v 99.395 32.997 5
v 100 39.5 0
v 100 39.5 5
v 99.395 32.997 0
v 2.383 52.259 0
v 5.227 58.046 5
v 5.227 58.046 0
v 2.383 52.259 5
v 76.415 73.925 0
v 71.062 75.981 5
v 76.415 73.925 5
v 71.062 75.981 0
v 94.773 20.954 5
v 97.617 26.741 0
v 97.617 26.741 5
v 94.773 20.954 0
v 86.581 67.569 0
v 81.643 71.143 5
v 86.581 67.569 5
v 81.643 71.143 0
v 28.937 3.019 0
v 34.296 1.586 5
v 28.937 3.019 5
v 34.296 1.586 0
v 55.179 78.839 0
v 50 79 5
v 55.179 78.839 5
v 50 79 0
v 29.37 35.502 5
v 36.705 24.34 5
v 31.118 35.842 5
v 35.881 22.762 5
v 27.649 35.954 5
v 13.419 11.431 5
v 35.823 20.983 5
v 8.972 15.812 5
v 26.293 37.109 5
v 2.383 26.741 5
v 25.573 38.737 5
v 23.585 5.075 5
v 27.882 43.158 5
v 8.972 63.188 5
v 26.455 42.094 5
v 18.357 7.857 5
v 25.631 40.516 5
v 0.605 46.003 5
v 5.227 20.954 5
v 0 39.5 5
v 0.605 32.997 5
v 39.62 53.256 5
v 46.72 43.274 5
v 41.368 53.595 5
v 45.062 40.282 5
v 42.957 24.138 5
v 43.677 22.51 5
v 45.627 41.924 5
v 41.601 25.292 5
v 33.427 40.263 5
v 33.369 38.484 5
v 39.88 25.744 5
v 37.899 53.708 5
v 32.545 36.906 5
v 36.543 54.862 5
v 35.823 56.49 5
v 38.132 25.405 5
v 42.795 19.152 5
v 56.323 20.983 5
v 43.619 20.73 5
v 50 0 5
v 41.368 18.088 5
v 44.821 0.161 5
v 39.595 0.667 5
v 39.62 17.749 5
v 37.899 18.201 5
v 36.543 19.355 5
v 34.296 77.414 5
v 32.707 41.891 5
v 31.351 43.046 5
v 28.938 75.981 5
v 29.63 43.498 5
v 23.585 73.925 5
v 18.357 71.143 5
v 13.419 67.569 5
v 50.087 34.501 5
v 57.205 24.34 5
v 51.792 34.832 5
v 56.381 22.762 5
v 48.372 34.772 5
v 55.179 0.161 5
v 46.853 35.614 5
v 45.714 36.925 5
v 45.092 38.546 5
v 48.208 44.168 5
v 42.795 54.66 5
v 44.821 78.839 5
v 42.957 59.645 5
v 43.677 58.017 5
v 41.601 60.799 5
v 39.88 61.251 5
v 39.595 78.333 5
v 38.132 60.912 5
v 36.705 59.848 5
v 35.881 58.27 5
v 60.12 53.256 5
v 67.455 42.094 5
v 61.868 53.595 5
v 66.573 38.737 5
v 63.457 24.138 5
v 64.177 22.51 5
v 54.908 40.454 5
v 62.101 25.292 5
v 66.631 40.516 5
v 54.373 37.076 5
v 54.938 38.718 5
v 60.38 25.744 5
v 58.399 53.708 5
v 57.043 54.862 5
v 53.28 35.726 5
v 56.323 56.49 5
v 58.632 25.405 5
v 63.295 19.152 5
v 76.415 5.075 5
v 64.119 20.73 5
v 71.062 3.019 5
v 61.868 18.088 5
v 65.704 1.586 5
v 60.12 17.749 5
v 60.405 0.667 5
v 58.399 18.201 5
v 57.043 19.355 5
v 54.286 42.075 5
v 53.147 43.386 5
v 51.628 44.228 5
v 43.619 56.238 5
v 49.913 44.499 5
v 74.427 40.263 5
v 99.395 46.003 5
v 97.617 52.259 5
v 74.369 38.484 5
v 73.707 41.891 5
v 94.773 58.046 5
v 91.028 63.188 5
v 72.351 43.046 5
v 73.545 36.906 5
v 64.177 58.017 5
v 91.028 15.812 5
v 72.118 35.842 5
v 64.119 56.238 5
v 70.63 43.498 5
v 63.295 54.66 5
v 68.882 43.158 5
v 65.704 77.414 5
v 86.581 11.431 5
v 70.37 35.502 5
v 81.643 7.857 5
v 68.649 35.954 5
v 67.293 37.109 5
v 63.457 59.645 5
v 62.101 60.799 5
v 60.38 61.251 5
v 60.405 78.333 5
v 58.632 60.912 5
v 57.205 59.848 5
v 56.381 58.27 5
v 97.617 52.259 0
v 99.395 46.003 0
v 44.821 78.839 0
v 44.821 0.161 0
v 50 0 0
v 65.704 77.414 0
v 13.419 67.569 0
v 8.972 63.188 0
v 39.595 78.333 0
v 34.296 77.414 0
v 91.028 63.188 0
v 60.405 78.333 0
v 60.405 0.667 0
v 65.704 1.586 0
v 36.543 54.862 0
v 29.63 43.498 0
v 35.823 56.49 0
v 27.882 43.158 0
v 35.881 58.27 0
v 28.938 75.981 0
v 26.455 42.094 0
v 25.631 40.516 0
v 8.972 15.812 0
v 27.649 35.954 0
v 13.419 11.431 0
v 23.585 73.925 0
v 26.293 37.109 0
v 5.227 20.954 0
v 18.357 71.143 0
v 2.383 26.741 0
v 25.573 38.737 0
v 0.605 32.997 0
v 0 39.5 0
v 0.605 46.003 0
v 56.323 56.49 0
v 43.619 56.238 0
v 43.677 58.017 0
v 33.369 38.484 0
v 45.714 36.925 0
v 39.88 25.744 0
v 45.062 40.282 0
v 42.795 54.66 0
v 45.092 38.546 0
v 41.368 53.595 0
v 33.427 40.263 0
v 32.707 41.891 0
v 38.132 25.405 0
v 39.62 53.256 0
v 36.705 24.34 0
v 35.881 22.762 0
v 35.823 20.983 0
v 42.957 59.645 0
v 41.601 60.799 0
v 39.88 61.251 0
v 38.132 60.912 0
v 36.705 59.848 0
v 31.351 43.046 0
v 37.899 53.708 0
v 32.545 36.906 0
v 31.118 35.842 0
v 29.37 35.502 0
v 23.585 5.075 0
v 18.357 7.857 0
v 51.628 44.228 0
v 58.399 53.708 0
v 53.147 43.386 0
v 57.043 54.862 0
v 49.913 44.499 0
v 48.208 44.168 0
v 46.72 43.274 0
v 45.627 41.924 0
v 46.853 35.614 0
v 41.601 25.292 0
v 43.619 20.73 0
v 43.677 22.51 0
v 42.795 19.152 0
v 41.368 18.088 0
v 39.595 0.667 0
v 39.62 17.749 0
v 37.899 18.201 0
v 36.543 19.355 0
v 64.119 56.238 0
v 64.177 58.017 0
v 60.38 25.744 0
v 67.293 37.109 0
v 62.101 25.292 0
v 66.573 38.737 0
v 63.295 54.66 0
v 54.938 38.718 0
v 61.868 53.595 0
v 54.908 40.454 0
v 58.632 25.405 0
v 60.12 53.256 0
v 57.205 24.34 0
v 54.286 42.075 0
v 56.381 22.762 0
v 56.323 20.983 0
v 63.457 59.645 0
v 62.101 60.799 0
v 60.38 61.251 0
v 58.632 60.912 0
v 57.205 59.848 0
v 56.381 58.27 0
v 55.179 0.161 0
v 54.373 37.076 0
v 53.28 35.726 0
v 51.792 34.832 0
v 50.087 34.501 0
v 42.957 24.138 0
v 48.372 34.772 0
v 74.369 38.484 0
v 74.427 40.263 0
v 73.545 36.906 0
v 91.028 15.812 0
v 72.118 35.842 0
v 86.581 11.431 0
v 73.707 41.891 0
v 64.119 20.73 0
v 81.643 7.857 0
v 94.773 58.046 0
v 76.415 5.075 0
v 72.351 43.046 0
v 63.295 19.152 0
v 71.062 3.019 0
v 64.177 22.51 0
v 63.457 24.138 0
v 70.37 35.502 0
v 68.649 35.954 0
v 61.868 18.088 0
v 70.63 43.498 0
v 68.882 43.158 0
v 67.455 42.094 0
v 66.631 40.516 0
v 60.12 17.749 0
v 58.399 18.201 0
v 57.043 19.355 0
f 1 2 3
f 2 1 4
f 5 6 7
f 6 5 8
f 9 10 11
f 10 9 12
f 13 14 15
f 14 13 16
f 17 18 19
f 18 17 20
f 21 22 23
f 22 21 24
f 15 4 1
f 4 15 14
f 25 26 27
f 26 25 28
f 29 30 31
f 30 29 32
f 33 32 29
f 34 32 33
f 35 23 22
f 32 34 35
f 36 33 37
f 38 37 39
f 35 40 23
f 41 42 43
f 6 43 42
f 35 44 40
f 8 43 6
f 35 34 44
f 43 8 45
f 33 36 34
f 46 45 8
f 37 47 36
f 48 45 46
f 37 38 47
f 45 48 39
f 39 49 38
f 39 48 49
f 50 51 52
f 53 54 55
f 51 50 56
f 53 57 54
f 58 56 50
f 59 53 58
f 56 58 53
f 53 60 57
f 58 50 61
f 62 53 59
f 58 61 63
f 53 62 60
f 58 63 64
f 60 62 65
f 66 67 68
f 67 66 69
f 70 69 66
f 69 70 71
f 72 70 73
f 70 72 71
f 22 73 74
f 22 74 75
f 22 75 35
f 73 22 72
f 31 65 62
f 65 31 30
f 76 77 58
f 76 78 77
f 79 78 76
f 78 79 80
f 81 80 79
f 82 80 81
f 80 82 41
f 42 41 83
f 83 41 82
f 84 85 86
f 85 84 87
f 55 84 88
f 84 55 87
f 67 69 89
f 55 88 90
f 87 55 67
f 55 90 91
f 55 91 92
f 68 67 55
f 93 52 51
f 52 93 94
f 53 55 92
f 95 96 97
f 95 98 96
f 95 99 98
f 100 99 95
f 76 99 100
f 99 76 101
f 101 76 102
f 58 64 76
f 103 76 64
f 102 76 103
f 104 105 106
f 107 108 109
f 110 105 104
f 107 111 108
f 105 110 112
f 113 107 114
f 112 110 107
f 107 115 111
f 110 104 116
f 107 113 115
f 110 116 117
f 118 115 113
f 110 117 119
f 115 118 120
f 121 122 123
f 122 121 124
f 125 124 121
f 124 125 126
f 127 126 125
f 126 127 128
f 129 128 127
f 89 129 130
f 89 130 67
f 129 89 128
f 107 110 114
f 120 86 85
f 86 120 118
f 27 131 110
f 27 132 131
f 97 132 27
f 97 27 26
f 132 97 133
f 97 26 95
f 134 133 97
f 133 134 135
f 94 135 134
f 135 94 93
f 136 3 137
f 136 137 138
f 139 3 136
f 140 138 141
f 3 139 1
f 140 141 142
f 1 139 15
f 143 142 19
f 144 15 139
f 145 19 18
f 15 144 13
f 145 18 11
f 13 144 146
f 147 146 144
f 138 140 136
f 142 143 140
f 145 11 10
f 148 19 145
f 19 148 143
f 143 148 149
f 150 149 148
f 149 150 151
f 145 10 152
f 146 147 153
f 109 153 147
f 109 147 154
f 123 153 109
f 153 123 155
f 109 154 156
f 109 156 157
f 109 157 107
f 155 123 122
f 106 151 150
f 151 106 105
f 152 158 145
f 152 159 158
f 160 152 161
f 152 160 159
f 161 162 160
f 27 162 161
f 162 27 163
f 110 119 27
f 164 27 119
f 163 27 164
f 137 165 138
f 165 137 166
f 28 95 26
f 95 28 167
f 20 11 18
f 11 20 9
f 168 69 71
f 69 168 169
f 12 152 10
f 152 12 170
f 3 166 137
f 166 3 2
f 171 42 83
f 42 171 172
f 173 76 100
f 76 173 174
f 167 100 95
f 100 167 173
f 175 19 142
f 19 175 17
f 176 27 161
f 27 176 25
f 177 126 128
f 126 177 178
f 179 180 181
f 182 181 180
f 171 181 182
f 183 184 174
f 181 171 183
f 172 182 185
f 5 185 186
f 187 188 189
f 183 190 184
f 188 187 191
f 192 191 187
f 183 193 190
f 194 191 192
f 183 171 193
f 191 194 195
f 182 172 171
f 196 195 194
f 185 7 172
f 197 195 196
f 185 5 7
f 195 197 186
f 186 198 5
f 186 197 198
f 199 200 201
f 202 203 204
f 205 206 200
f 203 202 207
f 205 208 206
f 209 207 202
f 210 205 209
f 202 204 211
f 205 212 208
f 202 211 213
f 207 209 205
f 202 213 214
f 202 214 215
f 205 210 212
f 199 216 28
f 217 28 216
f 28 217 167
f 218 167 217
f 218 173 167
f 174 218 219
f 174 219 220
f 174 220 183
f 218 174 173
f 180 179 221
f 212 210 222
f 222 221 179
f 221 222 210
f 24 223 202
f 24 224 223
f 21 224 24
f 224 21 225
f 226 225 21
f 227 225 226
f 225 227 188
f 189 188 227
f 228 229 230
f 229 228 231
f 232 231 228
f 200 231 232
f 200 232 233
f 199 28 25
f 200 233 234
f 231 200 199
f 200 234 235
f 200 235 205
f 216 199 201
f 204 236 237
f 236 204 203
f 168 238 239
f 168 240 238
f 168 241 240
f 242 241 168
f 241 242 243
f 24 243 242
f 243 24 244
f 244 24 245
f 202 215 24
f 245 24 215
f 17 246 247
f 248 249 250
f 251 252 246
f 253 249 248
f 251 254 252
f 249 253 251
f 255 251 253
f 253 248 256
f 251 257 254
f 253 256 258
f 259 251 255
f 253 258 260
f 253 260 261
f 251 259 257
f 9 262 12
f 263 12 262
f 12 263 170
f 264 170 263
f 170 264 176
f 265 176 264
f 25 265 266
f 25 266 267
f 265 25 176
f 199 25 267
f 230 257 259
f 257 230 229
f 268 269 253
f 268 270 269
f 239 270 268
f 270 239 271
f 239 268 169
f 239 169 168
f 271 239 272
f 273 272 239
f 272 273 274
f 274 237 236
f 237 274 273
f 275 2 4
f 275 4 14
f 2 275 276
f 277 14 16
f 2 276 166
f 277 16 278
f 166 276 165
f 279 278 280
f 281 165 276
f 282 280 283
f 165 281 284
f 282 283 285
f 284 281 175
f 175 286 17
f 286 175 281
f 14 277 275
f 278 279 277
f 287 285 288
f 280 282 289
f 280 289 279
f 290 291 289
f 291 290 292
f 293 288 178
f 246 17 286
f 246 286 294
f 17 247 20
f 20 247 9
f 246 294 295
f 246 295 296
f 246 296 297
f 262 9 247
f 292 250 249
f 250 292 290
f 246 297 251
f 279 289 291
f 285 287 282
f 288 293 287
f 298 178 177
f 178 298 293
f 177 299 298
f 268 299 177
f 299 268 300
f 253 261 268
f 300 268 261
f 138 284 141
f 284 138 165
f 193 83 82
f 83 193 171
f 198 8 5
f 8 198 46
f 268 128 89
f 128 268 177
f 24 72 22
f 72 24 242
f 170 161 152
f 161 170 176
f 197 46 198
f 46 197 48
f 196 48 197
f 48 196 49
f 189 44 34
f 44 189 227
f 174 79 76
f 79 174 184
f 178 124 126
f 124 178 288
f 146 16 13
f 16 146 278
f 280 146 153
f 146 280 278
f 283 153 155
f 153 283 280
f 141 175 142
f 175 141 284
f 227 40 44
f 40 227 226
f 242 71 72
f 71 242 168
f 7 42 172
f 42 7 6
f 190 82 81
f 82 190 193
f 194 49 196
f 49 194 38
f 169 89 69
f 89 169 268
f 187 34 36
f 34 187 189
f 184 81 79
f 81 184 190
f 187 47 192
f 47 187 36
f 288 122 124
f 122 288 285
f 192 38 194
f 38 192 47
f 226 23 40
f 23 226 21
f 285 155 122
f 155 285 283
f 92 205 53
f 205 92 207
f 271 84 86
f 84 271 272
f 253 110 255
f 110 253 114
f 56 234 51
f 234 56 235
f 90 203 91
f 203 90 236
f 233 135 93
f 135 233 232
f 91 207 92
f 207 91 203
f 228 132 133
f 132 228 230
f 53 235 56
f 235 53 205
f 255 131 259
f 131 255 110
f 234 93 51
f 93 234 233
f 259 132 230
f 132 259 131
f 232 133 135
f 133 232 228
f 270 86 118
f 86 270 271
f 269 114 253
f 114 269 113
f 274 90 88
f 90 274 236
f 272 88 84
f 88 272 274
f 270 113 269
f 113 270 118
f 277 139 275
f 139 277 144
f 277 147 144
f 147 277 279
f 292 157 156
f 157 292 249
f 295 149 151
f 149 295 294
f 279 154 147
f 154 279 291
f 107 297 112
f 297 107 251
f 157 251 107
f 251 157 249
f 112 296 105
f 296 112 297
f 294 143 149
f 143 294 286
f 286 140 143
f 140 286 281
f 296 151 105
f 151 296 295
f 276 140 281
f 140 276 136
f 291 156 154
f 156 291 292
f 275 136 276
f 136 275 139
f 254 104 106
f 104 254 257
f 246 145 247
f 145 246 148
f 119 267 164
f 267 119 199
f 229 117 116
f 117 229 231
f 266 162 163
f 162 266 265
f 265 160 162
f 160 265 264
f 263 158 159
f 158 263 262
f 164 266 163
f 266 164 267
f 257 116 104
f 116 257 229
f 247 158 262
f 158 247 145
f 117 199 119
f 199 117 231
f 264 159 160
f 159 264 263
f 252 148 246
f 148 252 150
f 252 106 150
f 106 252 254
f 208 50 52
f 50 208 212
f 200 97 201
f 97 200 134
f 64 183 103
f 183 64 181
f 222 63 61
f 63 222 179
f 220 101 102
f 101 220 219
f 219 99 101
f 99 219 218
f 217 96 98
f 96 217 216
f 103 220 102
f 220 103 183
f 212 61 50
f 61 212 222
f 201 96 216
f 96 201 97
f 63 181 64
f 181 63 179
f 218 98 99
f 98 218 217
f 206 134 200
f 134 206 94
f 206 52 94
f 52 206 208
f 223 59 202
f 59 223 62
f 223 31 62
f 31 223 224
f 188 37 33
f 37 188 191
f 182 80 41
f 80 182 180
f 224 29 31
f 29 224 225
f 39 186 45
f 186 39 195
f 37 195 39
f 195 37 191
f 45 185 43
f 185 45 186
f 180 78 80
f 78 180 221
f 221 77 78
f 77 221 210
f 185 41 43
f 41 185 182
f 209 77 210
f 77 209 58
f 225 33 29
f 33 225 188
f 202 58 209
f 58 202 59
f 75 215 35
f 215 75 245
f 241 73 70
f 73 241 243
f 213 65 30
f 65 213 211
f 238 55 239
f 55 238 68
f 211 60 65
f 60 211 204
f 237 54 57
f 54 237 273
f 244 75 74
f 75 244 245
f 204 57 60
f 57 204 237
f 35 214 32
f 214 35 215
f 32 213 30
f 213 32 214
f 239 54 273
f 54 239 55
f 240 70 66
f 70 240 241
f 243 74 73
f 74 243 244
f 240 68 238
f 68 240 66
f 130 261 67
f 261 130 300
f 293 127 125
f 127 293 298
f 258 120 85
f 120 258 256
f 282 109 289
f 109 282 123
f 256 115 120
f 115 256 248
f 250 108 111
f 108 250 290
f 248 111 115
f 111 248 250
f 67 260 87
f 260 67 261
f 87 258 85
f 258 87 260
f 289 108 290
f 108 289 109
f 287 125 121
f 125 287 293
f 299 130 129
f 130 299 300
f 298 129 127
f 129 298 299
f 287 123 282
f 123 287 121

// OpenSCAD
$fn = 32;

// ----------------------------------------------------------------------
// Cam plate: double_lobe cam, base R36
// ----------------------------------------------------------------------

// --- parameters (mm) ---
base_r = 36;              // base circle radius
lobe_h = 14;              // cam lobe rise
bore_r = 5;               // shaft bore radius
plate_t = 5;              // plate thickness, Z (extrusion height)
ring_r = 20.5;            // lightening ring radius
bolt_r = 4;               // lightening hole radius

profile = [[100, 39.5], [99.395, 46.003], [97.617, 52.259], [94.773, 58.046], [91.028, 63.188], [86.581, 67.569], [81.643, 71.143], [76.415, 73.925], [71.062, 75.981], [65.704, 77.414], [60.405, 78.333], [55.179, 78.839], [50, 79], [44.821, 78.839], [39.595, 78.333], [34.296, 77.414], [28.938, 75.981], [23.585, 73.925], [18.357, 71.143], [13.419, 67.569], [8.972, 63.188], [5.227, 58.046], [2.383, 52.259], [0.605, 46.003], [0, 39.5], [0.605, 32.997], [2.383, 26.741], [5.227, 20.954], [8.972, 15.812], [13.419, 11.431], [18.357, 7.857], [23.585, 5.075], [28.937, 3.019], [34.296, 1.586], [39.595, 0.667], [44.821, 0.161], [50, 0], [55.179, 0.161], [60.405, 0.667], [65.704, 1.586], [71.062, 3.019], [76.415, 5.075], [81.643, 7.857], [86.581, 11.431], [91.028, 15.812], [94.773, 20.954], [97.617, 26.741], [99.395, 32.997]];  // primary outline, 48 points, counter clockwise
void_1 = [[54.908, 40.454], [54.286, 42.075], [53.147, 43.386], [51.628, 44.228], [49.913, 44.499], [48.208, 44.168], [46.72, 43.274], [45.627, 41.924], [45.062, 40.282], [45.092, 38.546], [45.714, 36.925], [46.853, 35.614], [48.372, 34.772], [50.087, 34.501], [51.792, 34.832], [53.28, 35.726], [54.373, 37.076], [54.938, 38.718]];  // shaft bore, 18 points
void_2 = [[74.427, 40.263], [73.707, 41.891], [72.351, 43.046], [70.63, 43.498], [68.882, 43.158], [67.455, 42.094], [66.631, 40.516], [66.573, 38.737], [67.293, 37.109], [68.649, 35.954], [70.37, 35.502], [72.118, 35.842], [73.545, 36.906], [74.369, 38.484]];  // lightening hole 1, 14 points
void_3 = [[64.177, 58.017], [63.457, 59.645], [62.101, 60.799], [60.38, 61.251], [58.632, 60.912], [57.205, 59.848], [56.381, 58.27], [56.323, 56.49], [57.043, 54.862], [58.399, 53.708], [60.12, 53.256], [61.868, 53.595], [63.295, 54.66], [64.119, 56.238]];  // lightening hole 2, 14 points
void_4 = [[43.677, 58.017], [42.957, 59.645], [41.601, 60.799], [39.88, 61.251], [38.132, 60.912], [36.705, 59.848], [35.881, 58.27], [35.823, 56.49], [36.543, 54.862], [37.899, 53.708], [39.62, 53.256], [41.368, 53.595], [42.795, 54.66], [43.619, 56.238]];  // lightening hole 3, 14 points
void_5 = [[33.427, 40.263], [32.707, 41.891], [31.351, 43.046], [29.63, 43.498], [27.882, 43.158], [26.455, 42.094], [25.631, 40.516], [25.573, 38.737], [26.293, 37.109], [27.649, 35.954], [29.37, 35.502], [31.118, 35.842], [32.545, 36.906], [33.369, 38.484]];  // lightening hole 4, 14 points
void_6 = [[43.677, 22.51], [42.957, 24.138], [41.601, 25.292], [39.88, 25.744], [38.132, 25.405], [36.705, 24.34], [35.881, 22.762], [35.823, 20.983], [36.543, 19.355], [37.899, 18.201], [39.62, 17.749], [41.368, 18.088], [42.795, 19.152], [43.619, 20.73]];  // lightening hole 5, 14 points
void_7 = [[64.177, 22.51], [63.457, 24.138], [62.101, 25.292], [60.38, 25.744], [58.632, 25.405], [57.205, 24.34], [56.381, 22.762], [56.323, 20.983], [57.043, 19.355], [58.399, 18.201], [60.12, 17.749], [61.868, 18.088], [63.295, 19.152], [64.119, 20.73]];  // lightening hole 6, 14 points

// --- the one profile operation ---
difference() {
  linear_extrude(height = plate_t) polygon(points = profile);
  translate([0, 0, -1])
    linear_extrude(height = plate_t + 2) polygon(points = void_1);
  translate([0, 0, -1])
    linear_extrude(height = plate_t + 2) polygon(points = void_2);
  translate([0, 0, -1])
    linear_extrude(height = plate_t + 2) polygon(points = void_3);
  translate([0, 0, -1])
    linear_extrude(height = plate_t + 2) polygon(points = void_4);
  translate([0, 0, -1])
    linear_extrude(height = plate_t + 2) polygon(points = void_5);
  translate([0, 0, -1])
    linear_extrude(height = plate_t + 2) polygon(points = void_6);
  translate([0, 0, -1])
    linear_extrude(height = plate_t + 2) polygon(points = void_7);
}
